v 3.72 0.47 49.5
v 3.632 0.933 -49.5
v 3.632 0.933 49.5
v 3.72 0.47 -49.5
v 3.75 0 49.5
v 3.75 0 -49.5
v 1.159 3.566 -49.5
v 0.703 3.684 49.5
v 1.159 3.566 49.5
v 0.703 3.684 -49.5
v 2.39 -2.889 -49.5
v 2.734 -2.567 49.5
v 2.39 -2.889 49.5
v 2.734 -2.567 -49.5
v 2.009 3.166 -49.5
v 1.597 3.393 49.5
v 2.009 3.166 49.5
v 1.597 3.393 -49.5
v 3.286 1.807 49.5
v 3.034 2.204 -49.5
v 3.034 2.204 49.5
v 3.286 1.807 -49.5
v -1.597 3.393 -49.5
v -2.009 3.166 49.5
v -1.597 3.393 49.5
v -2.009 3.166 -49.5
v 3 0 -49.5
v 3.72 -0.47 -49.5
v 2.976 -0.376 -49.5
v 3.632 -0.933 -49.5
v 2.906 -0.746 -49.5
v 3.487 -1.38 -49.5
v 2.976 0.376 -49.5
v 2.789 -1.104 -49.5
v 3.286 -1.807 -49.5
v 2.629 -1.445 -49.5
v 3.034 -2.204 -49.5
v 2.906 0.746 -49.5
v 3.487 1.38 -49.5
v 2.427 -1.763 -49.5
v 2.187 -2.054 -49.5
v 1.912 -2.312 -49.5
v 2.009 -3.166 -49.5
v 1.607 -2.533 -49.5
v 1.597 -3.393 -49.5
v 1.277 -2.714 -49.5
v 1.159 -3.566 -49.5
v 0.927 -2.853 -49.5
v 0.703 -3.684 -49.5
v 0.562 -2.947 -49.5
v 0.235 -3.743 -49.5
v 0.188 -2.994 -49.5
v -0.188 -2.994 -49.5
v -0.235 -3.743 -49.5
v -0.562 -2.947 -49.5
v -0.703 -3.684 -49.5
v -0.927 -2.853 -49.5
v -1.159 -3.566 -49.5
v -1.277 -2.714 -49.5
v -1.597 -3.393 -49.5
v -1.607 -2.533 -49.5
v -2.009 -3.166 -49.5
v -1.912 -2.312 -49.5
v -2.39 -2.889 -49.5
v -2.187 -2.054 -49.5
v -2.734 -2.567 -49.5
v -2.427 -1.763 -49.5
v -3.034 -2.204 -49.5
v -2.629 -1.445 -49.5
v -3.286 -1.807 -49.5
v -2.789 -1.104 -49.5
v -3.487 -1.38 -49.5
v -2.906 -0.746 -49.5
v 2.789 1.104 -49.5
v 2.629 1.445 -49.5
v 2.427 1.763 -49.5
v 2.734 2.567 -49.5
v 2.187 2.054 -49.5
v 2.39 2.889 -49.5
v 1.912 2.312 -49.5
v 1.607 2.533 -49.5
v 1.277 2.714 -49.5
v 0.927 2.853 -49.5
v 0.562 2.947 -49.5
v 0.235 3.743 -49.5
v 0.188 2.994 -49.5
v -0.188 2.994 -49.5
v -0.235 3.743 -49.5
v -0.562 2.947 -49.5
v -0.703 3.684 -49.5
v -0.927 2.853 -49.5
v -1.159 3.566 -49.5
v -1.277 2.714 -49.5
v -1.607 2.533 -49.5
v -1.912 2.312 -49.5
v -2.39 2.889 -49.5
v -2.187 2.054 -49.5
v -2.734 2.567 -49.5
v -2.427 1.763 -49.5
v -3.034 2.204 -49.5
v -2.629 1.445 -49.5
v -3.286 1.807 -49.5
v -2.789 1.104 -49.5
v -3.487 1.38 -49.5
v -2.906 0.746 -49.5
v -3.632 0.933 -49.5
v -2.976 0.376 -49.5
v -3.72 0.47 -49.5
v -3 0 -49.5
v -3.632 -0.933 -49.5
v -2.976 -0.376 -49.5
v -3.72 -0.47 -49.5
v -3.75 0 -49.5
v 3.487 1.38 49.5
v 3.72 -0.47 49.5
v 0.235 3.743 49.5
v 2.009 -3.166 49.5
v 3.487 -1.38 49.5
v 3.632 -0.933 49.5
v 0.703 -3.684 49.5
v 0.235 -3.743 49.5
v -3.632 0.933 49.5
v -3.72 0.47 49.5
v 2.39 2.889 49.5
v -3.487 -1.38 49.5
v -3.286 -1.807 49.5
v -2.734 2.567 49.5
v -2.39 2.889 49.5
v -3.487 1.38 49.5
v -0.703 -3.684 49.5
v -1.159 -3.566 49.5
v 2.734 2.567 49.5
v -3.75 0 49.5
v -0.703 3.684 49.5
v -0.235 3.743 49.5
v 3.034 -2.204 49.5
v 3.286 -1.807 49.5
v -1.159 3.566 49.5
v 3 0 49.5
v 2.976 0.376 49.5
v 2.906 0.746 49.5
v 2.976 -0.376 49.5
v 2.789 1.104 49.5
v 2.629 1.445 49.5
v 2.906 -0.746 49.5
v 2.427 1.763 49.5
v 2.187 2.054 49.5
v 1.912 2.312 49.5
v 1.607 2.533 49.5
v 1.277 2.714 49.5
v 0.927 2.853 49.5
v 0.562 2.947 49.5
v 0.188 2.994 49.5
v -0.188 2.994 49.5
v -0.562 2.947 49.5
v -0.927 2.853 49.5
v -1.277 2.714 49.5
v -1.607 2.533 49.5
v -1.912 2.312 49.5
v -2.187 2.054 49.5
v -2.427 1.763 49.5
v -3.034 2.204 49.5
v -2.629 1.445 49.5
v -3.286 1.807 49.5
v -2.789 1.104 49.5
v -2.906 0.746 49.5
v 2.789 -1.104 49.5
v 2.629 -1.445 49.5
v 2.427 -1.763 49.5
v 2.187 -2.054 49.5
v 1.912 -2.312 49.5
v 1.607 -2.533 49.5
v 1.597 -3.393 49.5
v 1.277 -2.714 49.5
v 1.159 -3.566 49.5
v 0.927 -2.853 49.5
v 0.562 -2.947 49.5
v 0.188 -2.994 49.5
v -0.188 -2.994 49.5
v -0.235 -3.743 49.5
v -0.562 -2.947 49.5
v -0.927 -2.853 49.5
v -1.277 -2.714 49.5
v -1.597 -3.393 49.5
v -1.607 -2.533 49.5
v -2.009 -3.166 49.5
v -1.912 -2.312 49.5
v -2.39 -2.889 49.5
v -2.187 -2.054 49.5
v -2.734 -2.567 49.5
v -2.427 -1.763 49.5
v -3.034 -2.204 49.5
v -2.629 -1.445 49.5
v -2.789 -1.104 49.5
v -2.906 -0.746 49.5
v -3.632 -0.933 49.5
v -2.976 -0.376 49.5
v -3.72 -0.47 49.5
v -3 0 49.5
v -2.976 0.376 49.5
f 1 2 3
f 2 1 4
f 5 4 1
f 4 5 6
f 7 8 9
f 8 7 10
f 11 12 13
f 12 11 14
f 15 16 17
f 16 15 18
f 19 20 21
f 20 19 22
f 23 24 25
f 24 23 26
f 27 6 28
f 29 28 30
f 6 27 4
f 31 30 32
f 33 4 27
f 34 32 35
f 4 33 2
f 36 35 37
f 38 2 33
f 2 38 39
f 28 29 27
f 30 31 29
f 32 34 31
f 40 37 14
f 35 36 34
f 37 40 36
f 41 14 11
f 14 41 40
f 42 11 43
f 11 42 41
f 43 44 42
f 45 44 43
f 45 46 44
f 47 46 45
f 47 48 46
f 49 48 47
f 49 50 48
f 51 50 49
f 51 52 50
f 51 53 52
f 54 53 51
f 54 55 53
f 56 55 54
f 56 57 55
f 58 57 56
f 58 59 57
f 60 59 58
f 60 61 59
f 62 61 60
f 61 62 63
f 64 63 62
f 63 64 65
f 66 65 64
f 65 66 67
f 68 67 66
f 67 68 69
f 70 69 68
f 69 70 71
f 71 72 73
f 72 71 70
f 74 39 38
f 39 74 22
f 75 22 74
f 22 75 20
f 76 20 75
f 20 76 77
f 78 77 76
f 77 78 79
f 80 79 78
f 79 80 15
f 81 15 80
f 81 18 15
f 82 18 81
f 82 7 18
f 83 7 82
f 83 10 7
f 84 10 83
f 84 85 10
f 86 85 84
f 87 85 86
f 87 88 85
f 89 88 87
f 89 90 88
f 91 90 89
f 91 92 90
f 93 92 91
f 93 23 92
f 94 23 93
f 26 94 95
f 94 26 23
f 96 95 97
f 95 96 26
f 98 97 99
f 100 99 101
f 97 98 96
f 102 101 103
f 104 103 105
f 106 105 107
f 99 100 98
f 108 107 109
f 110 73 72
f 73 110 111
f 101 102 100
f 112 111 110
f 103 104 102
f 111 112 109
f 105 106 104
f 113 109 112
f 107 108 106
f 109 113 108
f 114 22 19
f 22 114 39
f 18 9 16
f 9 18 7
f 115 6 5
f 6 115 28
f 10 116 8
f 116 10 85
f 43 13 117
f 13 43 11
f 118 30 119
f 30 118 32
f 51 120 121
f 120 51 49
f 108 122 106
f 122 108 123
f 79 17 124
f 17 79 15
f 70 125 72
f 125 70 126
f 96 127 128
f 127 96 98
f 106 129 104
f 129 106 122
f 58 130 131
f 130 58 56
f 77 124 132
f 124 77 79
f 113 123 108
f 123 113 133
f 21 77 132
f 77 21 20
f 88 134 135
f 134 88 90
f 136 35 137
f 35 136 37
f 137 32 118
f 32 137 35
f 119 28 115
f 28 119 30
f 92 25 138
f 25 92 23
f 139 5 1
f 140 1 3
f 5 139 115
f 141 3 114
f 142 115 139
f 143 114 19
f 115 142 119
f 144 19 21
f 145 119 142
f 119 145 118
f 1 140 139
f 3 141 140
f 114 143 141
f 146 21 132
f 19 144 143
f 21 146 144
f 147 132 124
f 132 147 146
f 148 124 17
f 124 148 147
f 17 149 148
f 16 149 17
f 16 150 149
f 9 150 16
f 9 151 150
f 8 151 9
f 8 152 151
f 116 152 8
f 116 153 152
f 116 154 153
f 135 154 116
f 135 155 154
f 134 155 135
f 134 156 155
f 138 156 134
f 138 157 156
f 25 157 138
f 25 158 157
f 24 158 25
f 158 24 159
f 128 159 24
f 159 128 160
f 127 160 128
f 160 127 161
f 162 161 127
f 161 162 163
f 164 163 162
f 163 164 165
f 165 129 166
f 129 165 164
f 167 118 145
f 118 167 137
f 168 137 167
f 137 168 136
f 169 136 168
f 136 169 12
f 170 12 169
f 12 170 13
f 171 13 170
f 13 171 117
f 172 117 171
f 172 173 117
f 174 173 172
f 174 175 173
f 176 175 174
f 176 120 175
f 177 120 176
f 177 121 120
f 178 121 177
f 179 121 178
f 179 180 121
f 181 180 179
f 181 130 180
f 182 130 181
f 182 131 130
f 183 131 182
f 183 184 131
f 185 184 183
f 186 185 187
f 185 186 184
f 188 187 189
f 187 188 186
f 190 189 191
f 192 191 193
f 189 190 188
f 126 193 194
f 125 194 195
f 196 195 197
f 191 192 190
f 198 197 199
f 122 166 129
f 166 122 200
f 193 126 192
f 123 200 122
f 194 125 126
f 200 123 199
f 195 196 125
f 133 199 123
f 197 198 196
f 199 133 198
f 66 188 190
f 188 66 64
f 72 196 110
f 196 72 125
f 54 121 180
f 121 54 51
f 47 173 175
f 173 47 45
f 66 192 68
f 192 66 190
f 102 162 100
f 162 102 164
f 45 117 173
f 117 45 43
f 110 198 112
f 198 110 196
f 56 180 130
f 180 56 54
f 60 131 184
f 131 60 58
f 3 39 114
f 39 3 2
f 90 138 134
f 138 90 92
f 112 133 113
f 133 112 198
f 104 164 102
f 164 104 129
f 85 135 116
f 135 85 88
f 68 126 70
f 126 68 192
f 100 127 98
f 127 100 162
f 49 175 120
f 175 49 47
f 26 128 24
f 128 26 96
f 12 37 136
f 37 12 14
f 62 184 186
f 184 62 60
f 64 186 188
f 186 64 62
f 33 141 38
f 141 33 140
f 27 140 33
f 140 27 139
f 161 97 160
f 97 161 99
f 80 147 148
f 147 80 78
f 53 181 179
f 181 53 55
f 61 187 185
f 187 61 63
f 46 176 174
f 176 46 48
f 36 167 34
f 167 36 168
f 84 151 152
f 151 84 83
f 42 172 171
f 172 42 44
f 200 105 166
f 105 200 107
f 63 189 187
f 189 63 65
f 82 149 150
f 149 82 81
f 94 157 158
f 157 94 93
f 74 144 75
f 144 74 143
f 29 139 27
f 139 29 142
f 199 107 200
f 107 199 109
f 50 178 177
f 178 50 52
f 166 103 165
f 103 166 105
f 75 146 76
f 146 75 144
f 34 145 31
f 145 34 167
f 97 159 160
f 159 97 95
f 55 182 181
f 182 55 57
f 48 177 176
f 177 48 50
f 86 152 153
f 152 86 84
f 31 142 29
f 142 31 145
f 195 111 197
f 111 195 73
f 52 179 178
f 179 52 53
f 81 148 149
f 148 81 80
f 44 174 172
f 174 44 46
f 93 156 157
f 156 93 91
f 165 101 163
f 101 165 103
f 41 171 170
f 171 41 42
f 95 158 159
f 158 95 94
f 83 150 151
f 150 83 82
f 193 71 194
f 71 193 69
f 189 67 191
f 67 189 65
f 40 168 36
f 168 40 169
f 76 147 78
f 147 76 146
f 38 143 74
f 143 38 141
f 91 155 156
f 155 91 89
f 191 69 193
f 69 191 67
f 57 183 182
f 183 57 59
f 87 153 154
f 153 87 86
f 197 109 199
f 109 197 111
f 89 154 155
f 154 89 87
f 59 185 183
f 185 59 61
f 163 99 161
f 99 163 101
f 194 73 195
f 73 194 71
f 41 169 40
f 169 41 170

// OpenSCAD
$fn = 50;


difference() {
	union() {
		translate(v = [0, 0, -49.5000000000]) {
			cylinder(h = 99, r = 3.7500000000);
		}
	}
	union() {
		translate(v = [0, 0, -100.0000000000]) {
			cylinder(h = 200, r = 3.0000000000);
		}
	}
}
